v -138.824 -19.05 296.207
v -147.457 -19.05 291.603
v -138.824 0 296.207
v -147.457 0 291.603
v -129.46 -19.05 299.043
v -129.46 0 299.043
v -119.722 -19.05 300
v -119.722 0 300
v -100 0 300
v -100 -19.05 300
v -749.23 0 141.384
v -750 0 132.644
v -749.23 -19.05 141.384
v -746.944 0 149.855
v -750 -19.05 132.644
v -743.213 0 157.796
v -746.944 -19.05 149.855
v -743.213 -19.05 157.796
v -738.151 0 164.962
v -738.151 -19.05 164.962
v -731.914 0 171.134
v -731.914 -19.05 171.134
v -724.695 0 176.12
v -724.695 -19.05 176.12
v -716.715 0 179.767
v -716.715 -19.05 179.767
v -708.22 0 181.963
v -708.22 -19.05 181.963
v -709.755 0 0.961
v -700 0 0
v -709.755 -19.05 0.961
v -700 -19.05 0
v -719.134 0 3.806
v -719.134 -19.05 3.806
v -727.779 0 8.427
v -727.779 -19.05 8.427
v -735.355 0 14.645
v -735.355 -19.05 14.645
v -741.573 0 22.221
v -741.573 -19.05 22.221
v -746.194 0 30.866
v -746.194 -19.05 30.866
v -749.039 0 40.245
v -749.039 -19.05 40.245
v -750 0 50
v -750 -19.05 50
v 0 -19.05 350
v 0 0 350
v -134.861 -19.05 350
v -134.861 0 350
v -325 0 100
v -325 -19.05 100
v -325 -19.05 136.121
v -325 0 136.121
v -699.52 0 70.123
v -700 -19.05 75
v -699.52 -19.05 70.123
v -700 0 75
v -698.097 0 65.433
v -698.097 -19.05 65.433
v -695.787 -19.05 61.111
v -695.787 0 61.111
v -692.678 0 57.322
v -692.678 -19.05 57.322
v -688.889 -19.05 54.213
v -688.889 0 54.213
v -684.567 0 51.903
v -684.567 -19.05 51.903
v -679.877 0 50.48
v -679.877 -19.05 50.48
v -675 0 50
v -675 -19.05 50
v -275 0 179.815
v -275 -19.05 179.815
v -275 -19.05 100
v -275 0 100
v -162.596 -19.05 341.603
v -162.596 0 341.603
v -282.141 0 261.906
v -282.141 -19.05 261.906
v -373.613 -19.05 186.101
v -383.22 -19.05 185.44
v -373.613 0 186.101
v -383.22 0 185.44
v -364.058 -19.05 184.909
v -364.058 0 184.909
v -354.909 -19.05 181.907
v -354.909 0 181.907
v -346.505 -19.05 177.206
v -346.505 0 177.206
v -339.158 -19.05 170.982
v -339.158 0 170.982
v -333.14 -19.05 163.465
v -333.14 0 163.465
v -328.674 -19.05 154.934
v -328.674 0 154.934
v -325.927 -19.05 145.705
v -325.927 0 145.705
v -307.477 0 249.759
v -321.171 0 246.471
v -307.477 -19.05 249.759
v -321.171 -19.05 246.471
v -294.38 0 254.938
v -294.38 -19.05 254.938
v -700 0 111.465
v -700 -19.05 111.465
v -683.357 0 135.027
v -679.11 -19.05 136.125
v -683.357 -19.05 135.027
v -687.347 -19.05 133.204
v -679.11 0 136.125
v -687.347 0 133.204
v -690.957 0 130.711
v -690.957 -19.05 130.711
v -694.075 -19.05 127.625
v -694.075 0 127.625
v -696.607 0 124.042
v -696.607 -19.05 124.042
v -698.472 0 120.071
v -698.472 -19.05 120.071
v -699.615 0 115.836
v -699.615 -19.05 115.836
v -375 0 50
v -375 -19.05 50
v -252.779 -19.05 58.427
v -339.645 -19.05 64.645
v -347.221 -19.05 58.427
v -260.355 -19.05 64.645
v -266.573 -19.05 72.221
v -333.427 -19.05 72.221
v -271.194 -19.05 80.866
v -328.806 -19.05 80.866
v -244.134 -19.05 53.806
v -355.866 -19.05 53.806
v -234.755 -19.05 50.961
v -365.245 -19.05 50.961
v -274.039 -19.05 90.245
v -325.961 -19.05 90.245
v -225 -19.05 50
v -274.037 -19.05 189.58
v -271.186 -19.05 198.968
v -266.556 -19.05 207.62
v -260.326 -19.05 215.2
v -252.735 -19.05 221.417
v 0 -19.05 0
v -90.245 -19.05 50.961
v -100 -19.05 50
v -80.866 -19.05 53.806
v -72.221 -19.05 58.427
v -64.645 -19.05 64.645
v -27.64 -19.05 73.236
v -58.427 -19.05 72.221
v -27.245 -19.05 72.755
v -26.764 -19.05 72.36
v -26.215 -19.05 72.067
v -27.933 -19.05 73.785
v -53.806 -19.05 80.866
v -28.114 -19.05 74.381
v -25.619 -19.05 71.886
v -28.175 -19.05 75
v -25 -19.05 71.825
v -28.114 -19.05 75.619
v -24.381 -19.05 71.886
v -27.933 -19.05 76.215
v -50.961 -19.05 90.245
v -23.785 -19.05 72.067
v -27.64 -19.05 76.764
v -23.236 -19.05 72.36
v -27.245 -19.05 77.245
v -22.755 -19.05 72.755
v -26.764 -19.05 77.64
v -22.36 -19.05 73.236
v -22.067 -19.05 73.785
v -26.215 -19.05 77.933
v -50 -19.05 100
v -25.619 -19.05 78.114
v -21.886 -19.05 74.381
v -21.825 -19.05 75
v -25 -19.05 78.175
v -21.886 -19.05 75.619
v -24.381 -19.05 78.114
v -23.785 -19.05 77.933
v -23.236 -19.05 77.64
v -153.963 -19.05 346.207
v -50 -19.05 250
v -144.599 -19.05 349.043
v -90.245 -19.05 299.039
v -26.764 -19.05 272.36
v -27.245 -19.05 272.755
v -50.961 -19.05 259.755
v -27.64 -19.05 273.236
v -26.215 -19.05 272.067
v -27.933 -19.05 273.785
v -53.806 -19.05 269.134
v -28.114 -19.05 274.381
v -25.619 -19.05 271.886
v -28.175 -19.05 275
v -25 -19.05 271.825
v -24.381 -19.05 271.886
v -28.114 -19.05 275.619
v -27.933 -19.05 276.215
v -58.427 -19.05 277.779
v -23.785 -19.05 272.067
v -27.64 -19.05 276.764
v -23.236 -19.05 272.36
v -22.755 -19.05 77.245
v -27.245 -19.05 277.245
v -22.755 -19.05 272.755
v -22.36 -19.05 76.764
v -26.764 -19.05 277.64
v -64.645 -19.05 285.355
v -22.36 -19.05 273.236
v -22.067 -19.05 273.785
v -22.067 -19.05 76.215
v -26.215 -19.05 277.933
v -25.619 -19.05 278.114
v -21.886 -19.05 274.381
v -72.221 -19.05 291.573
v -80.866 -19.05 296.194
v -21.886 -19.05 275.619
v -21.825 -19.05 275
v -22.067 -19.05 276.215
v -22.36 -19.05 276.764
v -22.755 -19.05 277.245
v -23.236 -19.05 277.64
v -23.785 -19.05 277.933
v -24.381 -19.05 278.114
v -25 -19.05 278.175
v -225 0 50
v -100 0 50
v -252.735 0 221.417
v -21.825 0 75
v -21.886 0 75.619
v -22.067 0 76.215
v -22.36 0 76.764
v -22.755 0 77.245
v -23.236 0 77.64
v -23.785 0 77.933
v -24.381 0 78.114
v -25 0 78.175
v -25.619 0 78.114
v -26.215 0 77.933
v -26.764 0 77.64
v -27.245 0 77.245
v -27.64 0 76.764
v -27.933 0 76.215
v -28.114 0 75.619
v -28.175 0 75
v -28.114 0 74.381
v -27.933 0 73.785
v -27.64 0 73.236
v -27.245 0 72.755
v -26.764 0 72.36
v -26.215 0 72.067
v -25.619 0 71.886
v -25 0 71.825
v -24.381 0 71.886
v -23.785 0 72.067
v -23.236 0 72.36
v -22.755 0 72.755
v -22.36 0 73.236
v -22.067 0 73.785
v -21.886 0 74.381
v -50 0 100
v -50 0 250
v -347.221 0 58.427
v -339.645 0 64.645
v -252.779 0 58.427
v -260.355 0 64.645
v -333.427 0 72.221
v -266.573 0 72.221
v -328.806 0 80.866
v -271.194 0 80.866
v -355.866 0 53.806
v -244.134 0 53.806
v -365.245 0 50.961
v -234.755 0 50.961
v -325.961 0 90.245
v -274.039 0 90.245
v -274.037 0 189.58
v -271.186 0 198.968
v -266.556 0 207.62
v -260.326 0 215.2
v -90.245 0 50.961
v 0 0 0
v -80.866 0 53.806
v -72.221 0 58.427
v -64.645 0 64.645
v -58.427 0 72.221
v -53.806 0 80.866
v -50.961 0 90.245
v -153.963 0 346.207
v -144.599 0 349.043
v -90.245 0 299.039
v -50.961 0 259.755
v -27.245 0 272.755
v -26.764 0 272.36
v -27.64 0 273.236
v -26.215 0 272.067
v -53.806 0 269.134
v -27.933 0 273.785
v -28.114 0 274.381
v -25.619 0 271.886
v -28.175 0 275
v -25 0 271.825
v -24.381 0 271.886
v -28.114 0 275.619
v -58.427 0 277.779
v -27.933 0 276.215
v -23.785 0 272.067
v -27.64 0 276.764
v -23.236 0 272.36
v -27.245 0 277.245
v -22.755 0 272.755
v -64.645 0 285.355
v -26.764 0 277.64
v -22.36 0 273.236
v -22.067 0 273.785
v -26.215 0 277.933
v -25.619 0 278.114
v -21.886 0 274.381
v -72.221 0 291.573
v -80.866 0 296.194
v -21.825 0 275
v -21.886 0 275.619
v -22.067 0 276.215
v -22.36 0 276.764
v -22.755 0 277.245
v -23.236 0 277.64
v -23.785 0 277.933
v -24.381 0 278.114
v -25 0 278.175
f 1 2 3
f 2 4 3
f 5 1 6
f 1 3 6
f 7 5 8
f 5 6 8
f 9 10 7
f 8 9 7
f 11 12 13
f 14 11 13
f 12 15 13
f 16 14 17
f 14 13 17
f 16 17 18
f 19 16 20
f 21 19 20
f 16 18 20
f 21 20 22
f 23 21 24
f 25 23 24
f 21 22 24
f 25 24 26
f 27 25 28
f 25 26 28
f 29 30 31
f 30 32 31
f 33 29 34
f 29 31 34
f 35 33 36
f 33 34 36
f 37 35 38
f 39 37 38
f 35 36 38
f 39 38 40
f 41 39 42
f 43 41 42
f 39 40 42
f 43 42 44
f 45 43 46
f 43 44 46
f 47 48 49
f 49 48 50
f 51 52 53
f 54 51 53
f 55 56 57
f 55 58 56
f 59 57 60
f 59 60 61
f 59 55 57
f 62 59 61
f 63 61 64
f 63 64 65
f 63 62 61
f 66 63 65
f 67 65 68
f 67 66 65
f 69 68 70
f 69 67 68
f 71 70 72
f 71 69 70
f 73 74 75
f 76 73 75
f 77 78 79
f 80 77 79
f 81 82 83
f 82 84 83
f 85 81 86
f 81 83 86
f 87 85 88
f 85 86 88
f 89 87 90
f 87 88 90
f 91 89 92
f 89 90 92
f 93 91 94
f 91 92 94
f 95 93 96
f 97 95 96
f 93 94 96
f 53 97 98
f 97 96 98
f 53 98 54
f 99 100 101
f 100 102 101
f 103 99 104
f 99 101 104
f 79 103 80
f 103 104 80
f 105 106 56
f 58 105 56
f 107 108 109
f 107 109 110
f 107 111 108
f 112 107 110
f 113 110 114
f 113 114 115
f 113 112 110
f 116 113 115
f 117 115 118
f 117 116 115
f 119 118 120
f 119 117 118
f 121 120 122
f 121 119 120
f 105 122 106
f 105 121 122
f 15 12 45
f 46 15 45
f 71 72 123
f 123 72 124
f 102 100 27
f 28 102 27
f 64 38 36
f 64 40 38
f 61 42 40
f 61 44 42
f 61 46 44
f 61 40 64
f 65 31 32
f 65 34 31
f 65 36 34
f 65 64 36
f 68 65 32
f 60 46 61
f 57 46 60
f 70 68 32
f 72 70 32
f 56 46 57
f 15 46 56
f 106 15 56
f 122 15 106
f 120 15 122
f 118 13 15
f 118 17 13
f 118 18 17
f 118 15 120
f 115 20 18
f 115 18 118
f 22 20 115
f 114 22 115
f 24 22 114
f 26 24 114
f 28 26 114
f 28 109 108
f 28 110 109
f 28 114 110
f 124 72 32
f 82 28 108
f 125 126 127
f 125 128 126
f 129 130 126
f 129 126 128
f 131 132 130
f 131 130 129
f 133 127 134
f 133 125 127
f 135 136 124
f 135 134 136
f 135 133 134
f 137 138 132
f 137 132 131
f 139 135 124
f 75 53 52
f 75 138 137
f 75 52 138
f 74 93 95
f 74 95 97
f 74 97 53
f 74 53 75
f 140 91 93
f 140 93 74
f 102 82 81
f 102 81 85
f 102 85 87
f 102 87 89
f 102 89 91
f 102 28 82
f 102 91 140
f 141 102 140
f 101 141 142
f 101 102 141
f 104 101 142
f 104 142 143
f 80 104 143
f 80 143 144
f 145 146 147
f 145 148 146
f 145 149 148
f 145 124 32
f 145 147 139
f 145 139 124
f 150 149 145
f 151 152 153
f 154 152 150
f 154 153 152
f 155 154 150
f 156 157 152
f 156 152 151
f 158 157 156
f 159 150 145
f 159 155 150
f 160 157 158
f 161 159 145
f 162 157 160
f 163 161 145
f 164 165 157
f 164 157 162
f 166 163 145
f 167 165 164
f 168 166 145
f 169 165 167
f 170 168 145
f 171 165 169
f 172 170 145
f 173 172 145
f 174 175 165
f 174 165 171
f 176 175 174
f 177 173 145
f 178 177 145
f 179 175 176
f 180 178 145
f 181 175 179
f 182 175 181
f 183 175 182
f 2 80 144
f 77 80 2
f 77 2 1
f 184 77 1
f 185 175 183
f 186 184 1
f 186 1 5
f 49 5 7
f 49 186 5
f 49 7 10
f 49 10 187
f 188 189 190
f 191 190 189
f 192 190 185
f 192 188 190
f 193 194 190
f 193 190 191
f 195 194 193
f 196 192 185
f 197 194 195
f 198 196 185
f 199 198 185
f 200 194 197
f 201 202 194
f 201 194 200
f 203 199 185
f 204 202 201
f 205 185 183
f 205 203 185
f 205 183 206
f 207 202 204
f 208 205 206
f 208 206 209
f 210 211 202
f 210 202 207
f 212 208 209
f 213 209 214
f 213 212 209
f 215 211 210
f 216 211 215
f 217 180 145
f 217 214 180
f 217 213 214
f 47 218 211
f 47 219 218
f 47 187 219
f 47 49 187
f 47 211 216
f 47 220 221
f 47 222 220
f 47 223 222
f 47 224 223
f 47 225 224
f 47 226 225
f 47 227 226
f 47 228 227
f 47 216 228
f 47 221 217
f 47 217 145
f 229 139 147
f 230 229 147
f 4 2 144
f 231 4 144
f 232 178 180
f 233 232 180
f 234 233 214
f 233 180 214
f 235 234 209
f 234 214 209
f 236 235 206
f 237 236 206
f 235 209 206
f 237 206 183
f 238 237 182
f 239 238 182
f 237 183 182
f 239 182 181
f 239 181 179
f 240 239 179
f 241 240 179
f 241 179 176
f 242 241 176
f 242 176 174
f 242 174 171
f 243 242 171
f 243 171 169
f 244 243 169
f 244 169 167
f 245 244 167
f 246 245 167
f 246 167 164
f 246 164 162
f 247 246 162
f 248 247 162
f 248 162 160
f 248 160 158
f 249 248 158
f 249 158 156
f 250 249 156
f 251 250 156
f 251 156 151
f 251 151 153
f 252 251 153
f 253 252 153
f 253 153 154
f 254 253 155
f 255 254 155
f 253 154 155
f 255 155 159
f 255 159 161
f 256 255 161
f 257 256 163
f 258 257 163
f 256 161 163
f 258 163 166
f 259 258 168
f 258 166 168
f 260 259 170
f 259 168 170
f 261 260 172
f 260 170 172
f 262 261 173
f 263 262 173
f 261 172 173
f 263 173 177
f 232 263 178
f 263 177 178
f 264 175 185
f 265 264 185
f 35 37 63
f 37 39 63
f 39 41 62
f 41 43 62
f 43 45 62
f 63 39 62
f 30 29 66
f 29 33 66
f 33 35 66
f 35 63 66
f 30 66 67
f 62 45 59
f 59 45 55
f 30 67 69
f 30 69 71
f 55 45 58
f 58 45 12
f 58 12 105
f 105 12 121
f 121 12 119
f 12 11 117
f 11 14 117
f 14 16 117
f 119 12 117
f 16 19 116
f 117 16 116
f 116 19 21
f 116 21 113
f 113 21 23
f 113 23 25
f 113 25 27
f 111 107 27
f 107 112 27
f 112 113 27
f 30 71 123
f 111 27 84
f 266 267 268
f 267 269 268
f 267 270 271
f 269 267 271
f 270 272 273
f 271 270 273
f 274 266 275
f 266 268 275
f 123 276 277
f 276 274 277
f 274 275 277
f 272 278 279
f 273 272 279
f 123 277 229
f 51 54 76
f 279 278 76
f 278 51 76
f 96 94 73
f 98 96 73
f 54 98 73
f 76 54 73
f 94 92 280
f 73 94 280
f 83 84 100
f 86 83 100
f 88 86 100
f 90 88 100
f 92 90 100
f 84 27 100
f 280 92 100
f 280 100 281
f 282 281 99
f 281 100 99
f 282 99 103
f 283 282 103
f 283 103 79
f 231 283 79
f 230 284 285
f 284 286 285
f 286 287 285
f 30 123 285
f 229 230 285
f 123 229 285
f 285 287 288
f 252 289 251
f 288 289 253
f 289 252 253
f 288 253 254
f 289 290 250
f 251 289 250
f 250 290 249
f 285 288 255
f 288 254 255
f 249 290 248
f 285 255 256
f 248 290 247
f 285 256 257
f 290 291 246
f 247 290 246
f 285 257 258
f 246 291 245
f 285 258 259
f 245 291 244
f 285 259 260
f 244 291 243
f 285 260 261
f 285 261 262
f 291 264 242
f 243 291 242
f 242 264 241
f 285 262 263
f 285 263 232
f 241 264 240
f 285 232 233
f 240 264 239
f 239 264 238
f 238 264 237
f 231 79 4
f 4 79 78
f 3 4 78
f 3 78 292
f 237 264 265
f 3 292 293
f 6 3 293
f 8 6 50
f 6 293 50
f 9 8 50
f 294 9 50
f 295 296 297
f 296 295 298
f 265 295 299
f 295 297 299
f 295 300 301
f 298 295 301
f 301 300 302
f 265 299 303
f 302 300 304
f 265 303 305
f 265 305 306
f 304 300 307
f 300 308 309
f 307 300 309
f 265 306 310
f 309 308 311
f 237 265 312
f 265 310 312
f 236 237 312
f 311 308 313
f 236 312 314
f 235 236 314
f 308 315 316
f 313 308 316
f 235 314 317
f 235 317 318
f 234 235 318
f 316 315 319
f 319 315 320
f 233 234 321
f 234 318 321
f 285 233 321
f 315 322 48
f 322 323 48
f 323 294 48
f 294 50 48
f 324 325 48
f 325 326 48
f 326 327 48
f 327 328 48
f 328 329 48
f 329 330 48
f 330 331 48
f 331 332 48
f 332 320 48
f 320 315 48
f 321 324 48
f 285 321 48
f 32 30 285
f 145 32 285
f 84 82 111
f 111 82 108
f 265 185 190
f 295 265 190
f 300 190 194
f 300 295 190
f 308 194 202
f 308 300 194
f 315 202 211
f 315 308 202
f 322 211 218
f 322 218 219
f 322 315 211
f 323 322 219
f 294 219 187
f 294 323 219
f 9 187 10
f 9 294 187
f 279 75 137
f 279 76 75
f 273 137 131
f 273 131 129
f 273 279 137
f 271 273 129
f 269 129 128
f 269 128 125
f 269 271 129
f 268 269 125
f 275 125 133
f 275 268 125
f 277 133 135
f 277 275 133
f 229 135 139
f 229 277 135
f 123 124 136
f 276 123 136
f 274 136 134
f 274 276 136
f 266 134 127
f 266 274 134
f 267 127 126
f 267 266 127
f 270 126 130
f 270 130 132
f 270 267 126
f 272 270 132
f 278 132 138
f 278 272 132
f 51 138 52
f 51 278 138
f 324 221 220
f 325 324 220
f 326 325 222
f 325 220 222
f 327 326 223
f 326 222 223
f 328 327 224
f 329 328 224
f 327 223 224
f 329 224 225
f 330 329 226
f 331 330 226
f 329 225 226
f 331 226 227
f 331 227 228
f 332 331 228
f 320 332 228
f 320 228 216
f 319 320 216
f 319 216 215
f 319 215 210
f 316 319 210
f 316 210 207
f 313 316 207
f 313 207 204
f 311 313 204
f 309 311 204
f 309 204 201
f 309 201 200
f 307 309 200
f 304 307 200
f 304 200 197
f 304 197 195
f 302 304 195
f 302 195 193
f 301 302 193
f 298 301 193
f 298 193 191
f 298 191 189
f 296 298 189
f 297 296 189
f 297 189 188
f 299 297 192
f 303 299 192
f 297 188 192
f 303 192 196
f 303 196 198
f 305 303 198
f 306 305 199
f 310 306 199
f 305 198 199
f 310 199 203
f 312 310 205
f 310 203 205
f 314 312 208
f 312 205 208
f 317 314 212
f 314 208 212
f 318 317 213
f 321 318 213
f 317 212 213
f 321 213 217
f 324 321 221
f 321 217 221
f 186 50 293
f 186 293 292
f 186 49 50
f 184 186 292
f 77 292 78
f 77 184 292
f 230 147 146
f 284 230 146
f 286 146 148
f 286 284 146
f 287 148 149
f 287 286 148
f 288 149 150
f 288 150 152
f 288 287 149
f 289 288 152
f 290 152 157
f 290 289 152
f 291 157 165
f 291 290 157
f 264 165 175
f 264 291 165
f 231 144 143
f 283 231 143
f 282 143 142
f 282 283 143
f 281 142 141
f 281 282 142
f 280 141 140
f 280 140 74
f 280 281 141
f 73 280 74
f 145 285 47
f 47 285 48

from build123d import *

# Parameters (mm, degrees)
F1_DEPTH = 19.05
F3_DEPTH = 25
F4_R     = 50
F5_R     = 25
F6_R     = 50
F7_R     = 3.175
F8_DEPTH = 25
F9_R     = 100


with BuildPart() as f1:
    # F0 (on Front) → F1 (new body)
    with BuildSketch(Plane.XZ):
        Polygon((-750, 0), (0, 0), (0, 350), (-150, 350), (-300, 250), (-750, 175), align=None)
    extrude(amount=F1_DEPTH)

    # F2 (on face) → F3 (cut)
    with BuildSketch(Plane.XZ.offset(19.05)):
        Polygon((-325, 195.143646), (-700, 132.643646), (-700, 50), (-325, 50), align=None)
        Polygon((-134.861218, 300), (-275, 206.574145), (-275, 50), (-50, 50), (-50, 300), align=None)
    extrude(amount=-F3_DEPTH, mode=Mode.SUBTRACT)

    # F4
    f4_edges = [f1.edges().sort_by_distance(p)[0] for p in [
        (-325, -9.525, 195.143646),
        (-325, -9.525, 50),
        (-275, -9.525, 206.574145),
        (-134.861218, -9.525, 300),
        (-50, -9.525, 300),
        (-50, -9.525, 50),
        (-275, -9.525, 50),
    ]]
    fillet(f4_edges, radius=F4_R)

    # F5
    f5_edges = [f1.edges().sort_by_distance(p)[0] for p in [
        (-700, -9.525, 132.643646),
        (-700, -9.525, 50),
    ]]
    fillet(f5_edges, radius=F5_R)

    # F6
    f6_edges = [f1.edges().sort_by_distance(p)[0] for p in [
        (-750, -9.525, 175),
        (-750, -9.525, 0),
        (-150, -9.525, 350),
    ]]
    fillet(f6_edges, radius=F6_R)

    # F7 (on face) → F8 (cut)
    with BuildSketch(Plane.XZ.offset(19.05)):
        with Locations((-25, 275)):
            Circle(F7_R)
        with Locations((-25, 75)):
            Circle(F7_R)
    extrude(amount=-F8_DEPTH, mode=Mode.SUBTRACT)

    # F9
    f9_edges = [f1.edges().sort_by_distance(p)[0] for p in [
        (-300, -9.525, 250),
    ]]
    fillet(f9_edges, radius=F9_R)


solid = f1.part
